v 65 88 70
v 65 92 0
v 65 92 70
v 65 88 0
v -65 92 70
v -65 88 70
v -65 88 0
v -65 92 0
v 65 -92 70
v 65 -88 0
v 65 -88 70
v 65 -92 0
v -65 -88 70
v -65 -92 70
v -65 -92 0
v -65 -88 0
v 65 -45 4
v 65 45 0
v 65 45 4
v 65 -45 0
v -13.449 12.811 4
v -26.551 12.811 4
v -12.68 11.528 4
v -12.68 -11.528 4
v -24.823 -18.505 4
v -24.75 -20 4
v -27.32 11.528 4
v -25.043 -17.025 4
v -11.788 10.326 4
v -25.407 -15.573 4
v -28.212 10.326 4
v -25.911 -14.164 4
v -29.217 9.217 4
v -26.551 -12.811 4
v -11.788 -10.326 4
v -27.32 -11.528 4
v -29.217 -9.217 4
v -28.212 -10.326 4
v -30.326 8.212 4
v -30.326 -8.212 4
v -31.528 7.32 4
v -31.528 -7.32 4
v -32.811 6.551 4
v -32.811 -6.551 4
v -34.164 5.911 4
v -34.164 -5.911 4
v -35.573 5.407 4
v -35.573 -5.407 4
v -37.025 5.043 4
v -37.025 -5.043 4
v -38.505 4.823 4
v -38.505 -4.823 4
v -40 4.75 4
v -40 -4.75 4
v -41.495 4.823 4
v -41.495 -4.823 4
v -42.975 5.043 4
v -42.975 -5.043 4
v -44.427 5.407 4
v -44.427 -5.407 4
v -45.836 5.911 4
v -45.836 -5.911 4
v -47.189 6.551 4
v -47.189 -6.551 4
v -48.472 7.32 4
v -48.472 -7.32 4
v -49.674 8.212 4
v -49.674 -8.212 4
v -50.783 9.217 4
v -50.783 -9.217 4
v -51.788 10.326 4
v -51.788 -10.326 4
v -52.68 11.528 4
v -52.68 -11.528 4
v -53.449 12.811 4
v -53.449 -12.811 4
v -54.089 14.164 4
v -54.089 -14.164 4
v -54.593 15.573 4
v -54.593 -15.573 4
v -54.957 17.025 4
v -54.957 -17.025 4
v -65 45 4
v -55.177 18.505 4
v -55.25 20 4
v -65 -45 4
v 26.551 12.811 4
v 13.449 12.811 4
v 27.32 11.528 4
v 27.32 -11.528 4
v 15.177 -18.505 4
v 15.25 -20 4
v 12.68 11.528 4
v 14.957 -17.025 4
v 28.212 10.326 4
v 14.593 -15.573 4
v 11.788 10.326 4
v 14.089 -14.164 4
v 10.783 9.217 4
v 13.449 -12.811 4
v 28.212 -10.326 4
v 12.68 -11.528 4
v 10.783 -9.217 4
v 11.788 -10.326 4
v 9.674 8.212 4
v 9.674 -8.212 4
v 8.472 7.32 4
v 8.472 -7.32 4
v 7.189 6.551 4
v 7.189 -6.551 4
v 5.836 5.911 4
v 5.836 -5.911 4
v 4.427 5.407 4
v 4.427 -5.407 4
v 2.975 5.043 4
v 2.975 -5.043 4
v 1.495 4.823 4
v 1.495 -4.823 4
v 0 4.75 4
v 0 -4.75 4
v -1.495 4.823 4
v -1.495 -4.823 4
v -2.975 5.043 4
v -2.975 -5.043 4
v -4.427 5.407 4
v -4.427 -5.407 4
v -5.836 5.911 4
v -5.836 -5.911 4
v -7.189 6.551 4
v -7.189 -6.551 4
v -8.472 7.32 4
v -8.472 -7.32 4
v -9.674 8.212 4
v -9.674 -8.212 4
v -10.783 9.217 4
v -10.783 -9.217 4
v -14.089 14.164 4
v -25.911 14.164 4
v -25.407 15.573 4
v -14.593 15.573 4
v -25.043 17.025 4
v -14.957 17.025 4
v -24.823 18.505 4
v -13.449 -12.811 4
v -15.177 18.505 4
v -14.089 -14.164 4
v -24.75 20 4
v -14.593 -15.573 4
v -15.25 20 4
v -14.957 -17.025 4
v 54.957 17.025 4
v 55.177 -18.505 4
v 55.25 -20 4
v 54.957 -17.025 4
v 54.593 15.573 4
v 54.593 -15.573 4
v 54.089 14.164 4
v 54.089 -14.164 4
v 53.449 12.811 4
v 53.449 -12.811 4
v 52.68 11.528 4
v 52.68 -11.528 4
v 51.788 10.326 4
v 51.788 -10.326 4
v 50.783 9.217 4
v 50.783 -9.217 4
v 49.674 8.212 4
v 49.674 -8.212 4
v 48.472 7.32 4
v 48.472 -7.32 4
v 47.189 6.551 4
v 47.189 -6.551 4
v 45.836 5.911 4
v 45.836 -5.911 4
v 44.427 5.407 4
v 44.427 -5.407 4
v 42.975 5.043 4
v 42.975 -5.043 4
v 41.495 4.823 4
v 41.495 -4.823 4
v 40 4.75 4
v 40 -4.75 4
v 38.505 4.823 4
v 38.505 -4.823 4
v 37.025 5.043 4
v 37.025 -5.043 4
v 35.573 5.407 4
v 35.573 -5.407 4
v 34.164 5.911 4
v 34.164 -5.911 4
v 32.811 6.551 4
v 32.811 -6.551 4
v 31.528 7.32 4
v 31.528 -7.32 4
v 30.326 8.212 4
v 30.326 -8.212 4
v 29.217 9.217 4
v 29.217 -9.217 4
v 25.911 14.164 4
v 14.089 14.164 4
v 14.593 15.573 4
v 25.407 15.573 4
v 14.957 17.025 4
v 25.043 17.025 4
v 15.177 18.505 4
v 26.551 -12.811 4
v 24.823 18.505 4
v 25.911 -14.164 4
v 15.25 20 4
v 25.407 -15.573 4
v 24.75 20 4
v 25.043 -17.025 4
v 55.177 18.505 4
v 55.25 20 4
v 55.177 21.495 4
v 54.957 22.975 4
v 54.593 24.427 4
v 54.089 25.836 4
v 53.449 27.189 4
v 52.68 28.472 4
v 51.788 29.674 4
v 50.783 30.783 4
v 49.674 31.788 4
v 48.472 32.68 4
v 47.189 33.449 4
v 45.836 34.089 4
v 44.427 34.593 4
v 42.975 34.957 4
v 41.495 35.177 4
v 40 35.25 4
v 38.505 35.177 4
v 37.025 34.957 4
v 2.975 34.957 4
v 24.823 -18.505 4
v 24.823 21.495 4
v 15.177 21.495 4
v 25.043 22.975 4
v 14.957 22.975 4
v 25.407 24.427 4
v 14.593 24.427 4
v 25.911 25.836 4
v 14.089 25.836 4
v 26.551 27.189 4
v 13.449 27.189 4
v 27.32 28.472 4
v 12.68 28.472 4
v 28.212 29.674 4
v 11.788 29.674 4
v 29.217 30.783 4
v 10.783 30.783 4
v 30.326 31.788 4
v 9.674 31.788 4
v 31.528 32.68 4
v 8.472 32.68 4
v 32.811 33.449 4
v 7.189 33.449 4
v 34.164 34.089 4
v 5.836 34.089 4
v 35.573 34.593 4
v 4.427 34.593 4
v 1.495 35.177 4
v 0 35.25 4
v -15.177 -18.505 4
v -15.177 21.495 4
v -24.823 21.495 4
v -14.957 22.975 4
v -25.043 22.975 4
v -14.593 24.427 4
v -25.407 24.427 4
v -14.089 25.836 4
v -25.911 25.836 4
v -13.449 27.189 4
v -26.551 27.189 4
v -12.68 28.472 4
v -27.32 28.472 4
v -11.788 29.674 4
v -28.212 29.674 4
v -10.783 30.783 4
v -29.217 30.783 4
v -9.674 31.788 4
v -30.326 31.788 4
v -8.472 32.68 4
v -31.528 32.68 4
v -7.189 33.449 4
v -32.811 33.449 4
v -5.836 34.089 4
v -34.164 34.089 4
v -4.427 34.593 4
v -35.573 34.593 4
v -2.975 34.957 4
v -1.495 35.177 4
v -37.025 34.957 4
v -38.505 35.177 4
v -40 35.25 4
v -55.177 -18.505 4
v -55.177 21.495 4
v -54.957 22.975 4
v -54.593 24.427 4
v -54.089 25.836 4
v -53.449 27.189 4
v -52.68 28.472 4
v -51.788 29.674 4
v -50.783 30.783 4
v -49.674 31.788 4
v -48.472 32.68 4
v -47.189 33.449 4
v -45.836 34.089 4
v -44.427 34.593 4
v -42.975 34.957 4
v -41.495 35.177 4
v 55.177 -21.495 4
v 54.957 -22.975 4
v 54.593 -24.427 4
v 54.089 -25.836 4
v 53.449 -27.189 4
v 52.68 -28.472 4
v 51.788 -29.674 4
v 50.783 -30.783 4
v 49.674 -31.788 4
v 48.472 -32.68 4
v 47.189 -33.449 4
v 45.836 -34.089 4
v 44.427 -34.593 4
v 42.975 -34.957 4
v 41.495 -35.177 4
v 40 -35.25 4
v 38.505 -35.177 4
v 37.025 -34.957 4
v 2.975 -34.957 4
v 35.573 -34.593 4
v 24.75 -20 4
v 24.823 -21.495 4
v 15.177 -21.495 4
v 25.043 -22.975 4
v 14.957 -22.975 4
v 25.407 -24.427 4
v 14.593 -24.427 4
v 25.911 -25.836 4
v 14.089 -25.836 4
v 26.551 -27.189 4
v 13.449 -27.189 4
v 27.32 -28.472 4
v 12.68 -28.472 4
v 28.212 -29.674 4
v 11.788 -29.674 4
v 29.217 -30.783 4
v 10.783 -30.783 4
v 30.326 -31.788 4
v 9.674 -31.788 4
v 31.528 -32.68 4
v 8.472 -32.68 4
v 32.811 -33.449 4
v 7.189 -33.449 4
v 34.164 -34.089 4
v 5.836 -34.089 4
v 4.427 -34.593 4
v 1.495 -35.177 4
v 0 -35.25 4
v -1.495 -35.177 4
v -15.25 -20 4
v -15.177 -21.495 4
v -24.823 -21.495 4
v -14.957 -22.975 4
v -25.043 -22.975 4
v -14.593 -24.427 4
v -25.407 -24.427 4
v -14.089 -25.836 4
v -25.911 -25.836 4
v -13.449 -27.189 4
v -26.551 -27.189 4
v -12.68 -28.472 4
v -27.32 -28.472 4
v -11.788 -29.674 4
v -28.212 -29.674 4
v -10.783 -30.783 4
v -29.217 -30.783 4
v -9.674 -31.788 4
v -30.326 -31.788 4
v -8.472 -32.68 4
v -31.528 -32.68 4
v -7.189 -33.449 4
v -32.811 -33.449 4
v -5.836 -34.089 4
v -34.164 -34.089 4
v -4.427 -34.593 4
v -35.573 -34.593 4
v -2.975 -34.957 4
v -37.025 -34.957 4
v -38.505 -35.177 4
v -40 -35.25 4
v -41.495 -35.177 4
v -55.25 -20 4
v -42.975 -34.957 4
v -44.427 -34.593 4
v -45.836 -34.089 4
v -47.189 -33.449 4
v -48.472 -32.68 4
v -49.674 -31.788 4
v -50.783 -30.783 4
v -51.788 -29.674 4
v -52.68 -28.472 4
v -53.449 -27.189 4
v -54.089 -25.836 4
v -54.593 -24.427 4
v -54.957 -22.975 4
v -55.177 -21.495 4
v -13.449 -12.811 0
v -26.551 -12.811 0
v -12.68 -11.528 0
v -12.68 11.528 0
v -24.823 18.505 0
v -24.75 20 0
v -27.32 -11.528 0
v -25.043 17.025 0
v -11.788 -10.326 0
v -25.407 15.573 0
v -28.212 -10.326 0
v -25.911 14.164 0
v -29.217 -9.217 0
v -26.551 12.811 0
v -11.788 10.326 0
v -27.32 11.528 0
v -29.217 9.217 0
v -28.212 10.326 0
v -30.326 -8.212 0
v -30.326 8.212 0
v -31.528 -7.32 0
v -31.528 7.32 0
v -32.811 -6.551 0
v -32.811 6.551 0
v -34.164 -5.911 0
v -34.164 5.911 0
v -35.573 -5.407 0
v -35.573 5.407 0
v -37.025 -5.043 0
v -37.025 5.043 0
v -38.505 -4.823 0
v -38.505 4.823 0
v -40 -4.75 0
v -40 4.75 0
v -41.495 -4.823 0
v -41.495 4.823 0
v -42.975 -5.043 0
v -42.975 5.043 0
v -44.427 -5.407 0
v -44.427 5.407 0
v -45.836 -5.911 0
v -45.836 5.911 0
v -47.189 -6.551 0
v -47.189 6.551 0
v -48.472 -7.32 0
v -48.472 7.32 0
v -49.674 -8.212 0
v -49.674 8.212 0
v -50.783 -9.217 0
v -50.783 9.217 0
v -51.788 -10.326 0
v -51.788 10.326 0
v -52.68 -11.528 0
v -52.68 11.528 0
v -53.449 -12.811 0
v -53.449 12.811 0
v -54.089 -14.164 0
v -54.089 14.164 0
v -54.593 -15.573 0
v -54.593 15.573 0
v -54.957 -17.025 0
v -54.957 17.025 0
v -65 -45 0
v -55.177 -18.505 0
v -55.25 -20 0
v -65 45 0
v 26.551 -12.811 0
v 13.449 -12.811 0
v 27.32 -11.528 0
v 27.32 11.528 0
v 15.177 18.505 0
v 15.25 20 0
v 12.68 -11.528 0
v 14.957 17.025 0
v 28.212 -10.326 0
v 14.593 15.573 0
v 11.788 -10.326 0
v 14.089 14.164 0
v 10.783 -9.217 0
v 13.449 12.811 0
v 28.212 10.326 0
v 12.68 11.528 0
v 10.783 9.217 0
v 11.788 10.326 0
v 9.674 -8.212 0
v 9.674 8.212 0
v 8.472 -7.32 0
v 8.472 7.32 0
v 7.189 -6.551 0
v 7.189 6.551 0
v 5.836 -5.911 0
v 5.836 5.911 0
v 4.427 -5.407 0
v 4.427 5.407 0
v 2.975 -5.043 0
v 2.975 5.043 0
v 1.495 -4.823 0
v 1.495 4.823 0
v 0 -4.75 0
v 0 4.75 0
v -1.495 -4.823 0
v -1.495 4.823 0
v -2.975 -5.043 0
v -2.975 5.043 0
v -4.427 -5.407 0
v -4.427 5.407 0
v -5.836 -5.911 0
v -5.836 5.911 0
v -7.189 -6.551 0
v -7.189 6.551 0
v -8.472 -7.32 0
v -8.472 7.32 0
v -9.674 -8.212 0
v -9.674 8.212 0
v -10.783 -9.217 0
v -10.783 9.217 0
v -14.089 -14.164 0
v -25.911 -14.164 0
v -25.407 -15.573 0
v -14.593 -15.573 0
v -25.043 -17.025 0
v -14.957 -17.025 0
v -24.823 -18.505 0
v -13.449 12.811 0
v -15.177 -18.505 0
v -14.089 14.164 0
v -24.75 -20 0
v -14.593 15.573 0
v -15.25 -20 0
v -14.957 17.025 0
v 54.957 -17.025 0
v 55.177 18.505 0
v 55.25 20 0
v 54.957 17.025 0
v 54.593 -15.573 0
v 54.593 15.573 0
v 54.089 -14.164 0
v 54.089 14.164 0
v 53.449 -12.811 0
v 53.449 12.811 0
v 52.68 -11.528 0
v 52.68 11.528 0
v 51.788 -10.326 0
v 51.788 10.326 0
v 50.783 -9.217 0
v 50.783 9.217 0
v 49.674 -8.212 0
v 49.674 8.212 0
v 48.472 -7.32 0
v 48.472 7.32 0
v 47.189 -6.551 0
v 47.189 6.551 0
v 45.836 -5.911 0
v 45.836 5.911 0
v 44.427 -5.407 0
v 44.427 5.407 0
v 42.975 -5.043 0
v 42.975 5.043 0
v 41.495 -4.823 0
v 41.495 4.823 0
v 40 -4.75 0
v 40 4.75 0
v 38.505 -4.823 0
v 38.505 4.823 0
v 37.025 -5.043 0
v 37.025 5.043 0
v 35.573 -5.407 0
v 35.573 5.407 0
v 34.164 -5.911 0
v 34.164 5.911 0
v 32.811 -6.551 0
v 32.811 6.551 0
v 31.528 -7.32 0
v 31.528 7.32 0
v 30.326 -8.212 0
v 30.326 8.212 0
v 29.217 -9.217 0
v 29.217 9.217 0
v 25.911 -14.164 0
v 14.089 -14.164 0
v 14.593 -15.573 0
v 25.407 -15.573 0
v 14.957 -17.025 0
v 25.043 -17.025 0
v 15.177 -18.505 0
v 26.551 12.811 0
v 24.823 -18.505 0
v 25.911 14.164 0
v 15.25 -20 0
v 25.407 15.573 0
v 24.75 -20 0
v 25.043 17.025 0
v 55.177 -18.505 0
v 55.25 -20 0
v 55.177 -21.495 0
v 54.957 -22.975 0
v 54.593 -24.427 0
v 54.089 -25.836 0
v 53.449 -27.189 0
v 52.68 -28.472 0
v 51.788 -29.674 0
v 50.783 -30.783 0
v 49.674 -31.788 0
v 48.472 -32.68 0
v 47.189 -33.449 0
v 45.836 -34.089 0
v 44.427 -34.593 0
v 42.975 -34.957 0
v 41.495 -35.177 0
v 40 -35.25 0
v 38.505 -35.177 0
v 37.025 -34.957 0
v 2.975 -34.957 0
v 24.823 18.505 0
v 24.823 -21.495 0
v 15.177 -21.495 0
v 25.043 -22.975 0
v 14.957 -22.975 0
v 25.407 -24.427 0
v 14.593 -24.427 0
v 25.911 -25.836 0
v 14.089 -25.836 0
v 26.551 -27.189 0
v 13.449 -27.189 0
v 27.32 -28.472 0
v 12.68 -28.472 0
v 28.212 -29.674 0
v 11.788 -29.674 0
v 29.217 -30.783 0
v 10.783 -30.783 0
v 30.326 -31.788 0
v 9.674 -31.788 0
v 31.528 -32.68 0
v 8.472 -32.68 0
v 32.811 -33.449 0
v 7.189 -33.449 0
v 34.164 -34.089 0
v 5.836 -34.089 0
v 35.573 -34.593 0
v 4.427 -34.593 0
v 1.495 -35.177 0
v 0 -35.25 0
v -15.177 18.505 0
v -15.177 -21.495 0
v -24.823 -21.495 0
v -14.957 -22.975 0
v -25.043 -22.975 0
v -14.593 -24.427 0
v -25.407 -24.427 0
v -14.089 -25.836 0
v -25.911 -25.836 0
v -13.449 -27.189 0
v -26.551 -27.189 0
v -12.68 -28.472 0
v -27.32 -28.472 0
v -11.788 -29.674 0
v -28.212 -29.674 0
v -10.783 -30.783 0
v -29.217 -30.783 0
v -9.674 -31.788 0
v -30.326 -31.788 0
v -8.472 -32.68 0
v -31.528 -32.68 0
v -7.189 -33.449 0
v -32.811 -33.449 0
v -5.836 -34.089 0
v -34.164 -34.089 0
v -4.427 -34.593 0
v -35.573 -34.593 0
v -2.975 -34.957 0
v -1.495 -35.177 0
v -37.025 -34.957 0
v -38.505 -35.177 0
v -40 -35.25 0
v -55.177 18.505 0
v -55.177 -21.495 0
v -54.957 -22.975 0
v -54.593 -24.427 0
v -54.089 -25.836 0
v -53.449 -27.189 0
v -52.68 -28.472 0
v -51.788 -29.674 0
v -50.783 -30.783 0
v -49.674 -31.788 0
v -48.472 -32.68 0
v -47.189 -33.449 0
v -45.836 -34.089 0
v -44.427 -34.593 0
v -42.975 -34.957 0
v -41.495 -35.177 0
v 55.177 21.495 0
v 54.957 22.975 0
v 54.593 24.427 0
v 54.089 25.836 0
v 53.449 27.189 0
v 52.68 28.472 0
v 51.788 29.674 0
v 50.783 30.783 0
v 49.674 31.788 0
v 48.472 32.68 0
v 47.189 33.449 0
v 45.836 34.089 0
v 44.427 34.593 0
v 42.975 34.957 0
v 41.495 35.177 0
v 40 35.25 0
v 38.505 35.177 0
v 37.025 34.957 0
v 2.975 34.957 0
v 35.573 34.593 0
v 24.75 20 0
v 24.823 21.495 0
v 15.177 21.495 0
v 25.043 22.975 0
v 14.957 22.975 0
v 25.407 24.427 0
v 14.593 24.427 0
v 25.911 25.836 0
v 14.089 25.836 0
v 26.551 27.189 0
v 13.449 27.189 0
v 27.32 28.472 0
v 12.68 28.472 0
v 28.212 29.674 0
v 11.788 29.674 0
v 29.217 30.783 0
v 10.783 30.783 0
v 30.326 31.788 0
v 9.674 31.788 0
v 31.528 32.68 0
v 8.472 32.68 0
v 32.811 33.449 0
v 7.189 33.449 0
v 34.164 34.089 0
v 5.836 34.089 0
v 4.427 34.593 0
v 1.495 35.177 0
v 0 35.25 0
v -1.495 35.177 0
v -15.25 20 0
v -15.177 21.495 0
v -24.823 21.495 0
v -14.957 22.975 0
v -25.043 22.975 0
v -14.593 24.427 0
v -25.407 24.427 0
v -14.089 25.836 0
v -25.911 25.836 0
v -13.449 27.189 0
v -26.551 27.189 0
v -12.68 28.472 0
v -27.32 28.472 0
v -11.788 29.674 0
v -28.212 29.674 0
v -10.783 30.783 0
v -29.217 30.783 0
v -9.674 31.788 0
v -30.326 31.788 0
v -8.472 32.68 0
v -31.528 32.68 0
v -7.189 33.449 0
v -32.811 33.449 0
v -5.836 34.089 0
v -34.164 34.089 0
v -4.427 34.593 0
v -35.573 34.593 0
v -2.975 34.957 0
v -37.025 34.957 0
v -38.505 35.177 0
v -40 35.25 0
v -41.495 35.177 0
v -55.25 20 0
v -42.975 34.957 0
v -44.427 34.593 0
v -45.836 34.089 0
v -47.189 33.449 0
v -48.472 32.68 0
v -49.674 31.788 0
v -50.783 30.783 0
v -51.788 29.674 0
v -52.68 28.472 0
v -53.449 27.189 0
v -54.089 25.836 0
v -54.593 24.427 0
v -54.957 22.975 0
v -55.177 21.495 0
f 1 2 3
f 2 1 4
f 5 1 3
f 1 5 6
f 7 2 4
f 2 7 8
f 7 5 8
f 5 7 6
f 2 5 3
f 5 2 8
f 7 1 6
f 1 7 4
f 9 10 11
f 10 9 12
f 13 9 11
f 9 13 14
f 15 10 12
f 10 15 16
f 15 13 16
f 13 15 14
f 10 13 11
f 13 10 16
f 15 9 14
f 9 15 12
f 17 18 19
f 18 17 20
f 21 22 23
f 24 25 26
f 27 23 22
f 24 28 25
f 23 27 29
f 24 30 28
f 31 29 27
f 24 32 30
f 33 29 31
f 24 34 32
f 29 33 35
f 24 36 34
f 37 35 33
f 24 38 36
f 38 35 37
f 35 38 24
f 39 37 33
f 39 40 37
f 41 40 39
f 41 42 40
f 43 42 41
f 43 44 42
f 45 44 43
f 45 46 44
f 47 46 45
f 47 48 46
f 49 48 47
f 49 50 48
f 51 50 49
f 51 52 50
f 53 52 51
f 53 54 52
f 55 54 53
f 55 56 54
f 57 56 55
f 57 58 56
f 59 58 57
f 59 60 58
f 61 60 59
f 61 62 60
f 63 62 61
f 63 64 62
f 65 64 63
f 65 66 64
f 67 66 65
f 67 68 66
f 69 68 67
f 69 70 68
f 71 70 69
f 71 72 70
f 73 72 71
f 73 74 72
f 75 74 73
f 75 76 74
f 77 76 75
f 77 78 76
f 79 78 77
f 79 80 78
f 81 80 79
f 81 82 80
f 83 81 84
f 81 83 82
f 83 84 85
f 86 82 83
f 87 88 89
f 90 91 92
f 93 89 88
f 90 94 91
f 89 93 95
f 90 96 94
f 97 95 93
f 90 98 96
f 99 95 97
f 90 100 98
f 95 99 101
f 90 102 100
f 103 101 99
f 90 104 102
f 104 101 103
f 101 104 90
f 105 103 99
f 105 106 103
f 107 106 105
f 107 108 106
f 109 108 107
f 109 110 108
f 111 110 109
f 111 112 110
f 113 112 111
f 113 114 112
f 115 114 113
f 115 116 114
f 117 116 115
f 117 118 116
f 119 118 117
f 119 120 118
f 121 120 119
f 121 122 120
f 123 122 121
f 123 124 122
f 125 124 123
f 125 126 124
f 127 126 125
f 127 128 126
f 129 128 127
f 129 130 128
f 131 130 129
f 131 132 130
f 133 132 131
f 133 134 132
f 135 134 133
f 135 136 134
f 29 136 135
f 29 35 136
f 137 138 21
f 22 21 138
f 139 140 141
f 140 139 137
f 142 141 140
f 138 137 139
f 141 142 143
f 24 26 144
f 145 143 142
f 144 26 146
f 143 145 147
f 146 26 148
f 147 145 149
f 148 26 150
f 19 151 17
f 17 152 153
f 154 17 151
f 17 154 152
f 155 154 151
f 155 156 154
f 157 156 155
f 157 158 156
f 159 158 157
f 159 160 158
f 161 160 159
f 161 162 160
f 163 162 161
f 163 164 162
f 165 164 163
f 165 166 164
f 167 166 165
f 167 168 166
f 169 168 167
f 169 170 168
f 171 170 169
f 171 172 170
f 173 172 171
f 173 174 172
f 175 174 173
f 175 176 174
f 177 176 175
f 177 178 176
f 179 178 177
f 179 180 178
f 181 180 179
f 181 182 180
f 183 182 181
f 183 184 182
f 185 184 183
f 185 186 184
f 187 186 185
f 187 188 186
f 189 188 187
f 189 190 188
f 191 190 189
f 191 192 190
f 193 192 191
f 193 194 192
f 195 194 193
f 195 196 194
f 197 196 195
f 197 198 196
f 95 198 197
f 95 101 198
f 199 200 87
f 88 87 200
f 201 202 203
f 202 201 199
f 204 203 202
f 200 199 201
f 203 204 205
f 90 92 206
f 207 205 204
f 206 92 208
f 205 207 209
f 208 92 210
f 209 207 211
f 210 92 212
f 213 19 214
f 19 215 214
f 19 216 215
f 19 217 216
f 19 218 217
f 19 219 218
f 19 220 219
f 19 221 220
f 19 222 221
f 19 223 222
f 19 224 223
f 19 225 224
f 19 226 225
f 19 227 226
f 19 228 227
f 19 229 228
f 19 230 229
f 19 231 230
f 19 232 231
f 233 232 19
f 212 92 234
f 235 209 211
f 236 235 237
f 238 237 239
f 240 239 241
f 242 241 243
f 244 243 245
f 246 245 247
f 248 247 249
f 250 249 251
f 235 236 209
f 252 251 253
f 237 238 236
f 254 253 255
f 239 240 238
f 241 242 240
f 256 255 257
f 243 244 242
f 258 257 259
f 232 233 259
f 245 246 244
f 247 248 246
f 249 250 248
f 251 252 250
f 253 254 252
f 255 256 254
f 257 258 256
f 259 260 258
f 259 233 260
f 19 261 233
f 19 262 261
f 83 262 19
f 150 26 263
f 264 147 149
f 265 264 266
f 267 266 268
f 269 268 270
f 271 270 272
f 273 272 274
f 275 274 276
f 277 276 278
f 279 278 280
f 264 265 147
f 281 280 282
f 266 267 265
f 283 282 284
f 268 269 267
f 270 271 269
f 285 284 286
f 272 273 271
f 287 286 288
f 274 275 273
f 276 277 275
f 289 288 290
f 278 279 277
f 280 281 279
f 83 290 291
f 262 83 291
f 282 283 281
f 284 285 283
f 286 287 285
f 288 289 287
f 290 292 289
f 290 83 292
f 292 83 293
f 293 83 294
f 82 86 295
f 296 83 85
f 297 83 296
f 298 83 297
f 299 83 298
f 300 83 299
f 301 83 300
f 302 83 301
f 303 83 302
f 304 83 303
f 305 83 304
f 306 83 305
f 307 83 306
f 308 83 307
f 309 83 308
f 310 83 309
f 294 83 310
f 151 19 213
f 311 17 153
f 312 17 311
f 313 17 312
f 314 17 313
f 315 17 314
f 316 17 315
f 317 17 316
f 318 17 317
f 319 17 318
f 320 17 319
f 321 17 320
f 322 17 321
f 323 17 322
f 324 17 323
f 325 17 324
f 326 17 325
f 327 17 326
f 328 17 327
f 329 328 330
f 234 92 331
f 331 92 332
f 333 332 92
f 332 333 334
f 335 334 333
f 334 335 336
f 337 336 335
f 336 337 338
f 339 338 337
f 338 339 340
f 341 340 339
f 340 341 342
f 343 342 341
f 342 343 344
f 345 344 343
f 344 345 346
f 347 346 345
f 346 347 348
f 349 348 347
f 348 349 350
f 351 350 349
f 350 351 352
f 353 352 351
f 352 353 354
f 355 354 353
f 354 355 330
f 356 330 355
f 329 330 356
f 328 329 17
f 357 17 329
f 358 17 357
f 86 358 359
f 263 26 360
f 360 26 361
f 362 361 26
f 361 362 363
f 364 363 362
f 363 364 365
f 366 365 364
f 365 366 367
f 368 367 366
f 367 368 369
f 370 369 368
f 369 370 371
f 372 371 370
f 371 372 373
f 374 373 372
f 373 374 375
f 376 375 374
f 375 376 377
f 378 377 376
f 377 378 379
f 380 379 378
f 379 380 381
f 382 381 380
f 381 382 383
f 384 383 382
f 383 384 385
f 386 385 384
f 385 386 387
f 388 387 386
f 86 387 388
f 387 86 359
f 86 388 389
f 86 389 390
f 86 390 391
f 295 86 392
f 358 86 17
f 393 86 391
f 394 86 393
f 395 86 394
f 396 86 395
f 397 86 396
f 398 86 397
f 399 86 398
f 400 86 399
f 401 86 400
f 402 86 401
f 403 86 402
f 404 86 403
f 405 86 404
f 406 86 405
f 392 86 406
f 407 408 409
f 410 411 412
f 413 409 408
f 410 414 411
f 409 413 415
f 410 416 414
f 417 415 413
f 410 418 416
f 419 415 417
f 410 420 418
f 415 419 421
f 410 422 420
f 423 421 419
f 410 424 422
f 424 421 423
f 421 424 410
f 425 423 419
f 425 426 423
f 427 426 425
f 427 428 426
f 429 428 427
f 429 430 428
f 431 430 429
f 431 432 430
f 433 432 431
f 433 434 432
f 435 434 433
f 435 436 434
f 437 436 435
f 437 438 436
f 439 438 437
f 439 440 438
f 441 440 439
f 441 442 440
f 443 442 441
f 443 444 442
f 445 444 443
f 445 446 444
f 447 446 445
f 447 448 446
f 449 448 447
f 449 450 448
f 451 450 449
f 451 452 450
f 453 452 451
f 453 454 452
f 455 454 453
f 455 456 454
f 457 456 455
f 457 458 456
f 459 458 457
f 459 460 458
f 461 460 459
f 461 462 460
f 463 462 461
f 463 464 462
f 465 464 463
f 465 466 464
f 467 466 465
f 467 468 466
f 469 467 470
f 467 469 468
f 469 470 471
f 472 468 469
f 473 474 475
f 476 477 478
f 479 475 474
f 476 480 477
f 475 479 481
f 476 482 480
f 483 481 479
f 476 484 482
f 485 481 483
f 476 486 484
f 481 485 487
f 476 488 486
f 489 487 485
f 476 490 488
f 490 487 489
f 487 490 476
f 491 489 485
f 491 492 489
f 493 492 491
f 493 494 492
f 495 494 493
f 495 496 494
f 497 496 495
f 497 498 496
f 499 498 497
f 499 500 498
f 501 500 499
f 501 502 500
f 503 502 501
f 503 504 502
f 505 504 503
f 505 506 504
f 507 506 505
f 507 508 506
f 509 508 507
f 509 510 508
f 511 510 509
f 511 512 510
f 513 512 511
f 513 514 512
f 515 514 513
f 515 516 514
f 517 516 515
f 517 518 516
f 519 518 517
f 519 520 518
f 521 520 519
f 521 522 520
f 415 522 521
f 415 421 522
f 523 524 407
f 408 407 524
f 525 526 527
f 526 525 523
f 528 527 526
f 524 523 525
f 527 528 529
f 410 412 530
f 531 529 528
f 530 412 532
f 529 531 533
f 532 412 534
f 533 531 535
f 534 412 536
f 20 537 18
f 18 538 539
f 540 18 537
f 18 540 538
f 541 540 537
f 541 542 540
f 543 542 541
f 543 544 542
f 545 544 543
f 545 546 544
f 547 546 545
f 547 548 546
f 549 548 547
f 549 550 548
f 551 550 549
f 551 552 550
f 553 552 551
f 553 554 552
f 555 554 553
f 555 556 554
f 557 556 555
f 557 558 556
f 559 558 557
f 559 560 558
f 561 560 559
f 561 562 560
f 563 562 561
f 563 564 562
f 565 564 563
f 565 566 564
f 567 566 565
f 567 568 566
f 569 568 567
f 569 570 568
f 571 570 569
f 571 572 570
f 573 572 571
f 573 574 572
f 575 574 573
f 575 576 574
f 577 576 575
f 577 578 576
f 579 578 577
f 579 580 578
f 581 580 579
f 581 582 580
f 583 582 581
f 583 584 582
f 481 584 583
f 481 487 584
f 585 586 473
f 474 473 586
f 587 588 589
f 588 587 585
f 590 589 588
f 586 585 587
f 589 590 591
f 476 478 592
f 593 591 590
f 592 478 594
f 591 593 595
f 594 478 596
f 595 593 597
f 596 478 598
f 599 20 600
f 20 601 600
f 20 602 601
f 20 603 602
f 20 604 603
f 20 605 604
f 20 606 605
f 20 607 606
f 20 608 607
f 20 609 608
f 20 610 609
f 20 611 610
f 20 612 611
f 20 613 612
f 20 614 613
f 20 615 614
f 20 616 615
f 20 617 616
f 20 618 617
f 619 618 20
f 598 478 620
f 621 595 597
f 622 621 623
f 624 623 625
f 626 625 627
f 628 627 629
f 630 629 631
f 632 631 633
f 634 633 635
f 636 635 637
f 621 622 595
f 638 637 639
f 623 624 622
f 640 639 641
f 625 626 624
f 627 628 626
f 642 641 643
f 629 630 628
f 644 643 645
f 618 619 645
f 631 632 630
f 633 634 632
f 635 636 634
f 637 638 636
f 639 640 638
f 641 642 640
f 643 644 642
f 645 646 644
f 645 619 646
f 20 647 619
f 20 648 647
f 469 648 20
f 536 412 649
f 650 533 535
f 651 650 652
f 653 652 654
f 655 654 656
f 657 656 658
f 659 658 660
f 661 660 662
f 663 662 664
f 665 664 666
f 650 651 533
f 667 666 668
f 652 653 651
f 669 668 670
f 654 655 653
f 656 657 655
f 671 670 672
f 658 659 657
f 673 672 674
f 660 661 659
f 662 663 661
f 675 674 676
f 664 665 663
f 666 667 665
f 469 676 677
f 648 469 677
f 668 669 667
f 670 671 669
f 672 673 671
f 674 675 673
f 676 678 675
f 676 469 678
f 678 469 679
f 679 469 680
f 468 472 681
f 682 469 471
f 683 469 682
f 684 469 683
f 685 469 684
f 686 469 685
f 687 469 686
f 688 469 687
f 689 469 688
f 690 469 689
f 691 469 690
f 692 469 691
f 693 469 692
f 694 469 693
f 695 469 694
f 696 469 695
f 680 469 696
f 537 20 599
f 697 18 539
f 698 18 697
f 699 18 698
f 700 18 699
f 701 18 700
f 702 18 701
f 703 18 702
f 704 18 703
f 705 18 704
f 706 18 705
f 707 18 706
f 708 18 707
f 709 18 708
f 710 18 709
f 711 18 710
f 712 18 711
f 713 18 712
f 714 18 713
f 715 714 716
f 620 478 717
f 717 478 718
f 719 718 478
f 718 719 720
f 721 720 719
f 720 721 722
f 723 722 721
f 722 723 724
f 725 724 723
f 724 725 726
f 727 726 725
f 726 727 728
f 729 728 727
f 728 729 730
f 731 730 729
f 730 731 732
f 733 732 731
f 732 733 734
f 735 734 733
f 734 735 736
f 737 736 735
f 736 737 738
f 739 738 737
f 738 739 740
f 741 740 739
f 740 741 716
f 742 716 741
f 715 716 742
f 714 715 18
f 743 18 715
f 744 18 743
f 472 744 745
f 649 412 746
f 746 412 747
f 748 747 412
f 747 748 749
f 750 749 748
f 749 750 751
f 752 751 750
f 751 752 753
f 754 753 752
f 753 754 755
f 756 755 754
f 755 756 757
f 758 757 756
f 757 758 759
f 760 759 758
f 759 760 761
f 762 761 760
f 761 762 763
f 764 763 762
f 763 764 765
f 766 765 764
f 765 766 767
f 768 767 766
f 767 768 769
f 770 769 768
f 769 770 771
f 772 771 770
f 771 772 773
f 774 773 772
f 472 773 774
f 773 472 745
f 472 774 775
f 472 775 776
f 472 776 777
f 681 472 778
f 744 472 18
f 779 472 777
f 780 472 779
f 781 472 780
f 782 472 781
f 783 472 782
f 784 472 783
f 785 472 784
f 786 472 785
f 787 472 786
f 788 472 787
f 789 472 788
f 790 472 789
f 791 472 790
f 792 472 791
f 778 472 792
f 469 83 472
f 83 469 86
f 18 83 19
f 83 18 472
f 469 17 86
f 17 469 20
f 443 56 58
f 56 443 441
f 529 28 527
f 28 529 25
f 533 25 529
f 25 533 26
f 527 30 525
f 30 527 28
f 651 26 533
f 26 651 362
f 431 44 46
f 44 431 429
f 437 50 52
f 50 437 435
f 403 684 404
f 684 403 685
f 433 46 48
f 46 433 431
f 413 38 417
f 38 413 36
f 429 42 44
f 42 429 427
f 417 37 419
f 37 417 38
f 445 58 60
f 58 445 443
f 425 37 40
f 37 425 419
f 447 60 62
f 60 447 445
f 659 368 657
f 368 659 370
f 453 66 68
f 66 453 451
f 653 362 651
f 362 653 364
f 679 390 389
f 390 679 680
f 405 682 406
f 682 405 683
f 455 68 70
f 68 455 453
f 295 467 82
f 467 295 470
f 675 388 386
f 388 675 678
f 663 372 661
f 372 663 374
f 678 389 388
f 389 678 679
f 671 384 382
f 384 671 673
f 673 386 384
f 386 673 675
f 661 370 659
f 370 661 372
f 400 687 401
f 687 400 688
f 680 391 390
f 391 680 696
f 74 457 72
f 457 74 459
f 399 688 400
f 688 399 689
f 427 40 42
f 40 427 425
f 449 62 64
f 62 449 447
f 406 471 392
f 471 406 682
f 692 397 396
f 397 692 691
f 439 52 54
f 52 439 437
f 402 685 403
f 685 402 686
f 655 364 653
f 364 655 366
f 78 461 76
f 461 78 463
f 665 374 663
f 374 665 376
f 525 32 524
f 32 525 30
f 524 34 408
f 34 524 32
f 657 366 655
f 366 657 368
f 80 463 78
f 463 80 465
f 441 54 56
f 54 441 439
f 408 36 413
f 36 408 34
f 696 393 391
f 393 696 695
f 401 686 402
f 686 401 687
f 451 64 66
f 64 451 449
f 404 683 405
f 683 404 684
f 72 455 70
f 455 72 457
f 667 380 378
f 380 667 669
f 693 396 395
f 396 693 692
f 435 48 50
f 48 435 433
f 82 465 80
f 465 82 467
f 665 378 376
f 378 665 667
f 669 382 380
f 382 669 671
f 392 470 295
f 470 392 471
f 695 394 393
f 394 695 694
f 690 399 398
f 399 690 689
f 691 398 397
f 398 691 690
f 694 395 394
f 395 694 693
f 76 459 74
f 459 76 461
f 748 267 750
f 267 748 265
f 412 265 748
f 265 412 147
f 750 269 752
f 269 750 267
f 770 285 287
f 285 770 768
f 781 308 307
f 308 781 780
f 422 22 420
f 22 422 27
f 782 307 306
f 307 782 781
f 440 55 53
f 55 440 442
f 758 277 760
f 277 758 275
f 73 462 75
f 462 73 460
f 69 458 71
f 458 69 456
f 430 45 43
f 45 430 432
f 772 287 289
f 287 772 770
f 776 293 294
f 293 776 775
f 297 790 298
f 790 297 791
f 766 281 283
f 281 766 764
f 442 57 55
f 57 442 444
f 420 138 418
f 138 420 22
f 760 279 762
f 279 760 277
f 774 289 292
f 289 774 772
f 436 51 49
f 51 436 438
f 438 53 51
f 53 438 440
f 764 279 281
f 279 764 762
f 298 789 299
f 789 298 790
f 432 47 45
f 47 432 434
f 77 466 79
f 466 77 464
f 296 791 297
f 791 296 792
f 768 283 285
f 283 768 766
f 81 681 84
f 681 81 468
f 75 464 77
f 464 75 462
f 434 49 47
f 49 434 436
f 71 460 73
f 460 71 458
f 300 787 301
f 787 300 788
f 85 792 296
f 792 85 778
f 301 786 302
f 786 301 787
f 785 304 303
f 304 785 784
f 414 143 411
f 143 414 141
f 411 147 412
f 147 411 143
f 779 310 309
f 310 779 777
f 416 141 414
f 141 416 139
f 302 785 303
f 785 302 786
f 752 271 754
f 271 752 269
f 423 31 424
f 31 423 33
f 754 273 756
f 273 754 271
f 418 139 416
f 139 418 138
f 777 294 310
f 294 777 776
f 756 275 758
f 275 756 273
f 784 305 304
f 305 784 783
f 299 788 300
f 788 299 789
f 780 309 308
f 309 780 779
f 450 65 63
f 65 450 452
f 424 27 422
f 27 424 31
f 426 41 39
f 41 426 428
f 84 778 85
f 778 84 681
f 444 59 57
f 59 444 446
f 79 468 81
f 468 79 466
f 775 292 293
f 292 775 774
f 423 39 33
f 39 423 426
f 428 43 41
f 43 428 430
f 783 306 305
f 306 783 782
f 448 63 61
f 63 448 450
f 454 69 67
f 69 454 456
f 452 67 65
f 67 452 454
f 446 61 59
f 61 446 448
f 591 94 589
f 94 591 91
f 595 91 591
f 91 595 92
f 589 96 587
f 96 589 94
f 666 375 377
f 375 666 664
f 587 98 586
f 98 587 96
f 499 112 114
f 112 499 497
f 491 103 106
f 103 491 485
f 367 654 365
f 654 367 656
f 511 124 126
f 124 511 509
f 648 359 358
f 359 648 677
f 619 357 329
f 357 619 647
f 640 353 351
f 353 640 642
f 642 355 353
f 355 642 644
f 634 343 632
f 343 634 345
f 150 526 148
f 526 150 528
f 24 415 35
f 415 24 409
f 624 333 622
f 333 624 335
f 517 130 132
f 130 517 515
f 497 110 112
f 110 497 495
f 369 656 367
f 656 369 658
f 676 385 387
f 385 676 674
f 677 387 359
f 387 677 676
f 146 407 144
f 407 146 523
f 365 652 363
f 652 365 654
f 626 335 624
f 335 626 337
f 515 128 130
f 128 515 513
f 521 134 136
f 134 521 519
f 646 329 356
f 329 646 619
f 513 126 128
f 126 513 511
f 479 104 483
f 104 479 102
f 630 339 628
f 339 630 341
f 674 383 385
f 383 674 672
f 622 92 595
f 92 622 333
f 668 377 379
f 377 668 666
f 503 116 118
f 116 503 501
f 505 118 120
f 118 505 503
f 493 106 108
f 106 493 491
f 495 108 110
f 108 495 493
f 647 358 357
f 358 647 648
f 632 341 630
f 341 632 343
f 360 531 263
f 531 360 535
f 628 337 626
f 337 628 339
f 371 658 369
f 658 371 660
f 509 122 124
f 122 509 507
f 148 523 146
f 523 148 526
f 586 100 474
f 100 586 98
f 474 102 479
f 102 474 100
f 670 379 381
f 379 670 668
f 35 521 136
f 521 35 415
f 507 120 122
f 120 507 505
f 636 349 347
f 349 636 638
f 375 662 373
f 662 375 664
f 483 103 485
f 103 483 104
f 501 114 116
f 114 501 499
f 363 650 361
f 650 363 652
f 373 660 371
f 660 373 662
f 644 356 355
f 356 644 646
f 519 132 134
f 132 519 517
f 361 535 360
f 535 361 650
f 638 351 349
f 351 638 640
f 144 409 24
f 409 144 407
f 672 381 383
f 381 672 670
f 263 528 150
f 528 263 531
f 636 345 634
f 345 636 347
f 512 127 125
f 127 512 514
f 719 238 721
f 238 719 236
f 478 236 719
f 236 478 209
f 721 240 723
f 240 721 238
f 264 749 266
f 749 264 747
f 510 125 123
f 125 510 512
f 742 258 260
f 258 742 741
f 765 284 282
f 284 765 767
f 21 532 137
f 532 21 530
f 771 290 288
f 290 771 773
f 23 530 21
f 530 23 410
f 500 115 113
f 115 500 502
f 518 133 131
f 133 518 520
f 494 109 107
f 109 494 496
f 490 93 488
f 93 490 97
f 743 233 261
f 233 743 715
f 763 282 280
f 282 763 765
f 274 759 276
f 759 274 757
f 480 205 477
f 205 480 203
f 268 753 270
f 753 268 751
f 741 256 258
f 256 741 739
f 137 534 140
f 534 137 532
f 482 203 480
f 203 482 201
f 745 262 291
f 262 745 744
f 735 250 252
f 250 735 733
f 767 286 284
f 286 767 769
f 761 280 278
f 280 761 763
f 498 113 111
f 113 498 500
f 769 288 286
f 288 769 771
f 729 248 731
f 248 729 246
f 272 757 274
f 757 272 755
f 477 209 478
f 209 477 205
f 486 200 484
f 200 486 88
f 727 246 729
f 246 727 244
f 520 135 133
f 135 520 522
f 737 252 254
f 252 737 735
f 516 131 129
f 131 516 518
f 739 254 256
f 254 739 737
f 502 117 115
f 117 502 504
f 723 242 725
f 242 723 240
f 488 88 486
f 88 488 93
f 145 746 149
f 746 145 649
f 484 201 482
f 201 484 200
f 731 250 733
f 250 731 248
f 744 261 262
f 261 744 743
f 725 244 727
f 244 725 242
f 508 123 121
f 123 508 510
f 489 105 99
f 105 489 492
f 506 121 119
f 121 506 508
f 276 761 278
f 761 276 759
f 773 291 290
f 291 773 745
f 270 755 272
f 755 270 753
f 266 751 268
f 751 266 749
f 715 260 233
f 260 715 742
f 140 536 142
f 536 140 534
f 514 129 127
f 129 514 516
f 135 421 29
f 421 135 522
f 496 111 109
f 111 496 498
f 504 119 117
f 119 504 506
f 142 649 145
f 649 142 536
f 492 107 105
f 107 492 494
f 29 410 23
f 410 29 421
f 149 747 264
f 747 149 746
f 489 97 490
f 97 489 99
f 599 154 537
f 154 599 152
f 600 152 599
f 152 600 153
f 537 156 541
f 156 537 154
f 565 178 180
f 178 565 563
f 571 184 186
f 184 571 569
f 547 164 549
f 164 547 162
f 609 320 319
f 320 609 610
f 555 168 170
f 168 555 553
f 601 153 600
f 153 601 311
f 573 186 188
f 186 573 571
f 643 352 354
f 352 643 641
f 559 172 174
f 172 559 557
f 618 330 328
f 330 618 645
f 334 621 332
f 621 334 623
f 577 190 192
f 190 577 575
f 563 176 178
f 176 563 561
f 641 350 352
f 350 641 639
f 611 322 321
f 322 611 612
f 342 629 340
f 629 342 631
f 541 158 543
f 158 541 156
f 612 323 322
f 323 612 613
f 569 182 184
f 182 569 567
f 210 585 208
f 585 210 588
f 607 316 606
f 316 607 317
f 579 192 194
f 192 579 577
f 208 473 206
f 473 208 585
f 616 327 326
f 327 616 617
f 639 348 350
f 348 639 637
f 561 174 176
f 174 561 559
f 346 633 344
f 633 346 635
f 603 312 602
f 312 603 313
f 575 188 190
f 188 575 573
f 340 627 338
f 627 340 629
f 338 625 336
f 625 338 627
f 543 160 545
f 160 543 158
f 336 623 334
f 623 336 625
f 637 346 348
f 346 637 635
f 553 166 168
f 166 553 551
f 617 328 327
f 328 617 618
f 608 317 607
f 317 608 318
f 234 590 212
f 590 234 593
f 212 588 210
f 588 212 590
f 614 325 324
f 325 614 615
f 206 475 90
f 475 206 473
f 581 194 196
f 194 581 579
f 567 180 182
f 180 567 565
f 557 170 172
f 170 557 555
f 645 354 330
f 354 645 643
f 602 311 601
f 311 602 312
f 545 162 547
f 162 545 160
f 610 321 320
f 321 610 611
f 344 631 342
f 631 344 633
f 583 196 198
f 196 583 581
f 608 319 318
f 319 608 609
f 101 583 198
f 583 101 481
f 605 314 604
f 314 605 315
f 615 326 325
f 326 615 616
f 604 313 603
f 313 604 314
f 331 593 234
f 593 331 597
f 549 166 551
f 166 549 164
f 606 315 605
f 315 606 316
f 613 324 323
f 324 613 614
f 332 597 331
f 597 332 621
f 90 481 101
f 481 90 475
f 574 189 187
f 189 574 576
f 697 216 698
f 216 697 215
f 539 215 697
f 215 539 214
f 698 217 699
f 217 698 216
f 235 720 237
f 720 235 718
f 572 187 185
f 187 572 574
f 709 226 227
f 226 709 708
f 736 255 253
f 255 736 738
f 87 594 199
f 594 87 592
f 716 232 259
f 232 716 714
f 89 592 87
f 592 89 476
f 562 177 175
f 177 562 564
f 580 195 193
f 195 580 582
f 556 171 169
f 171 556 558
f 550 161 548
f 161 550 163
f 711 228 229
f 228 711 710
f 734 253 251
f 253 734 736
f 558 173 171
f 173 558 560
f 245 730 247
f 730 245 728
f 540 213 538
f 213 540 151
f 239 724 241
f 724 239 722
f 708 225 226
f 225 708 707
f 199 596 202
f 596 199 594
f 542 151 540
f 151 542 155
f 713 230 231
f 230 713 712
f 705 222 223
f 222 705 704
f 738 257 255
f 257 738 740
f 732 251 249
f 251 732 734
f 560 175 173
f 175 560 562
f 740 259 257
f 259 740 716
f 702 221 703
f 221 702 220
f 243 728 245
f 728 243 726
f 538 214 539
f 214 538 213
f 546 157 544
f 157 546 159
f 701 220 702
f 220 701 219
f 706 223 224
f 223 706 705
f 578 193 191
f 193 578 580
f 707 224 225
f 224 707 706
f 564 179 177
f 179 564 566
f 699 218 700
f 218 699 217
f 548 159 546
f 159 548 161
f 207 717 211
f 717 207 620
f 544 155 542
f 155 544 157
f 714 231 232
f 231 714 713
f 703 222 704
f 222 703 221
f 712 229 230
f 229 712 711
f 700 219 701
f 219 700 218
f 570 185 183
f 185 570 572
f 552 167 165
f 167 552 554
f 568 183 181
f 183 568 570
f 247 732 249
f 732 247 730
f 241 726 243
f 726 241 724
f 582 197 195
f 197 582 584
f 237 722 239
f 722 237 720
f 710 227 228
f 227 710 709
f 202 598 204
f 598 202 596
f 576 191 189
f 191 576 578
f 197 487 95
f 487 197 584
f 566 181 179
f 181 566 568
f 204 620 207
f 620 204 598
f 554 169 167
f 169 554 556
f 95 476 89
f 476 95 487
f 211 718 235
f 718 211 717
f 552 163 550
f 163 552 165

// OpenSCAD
// Rack for six 50 mL conical (Falcon-type) tubes
// Printed upside down and flipped over after printing

$fn = 64;

// Plate dimensions
plate_x = 130; // mm, X direction
plate_y = 90;  // mm, Y direction
plate_z = 4;   // mm, thickness

// Hole pattern
hole_diameter = 30.5; // mm
hole_spacing_x = 40;  // mm, centre-to-centre in X
hole_spacing_y = 40;  // mm, centre-to-centre in Y
hole_rows = 2;        // number of rows (along Y)
hole_cols = 3;        // number of columns (along X)

// Wall dimensions
wall_thickness = 4;   // mm
wall_height = 70;     // mm

// Compute hole positions (centred on plate)
hole_x_offset = (plate_x - (hole_cols - 1) * hole_spacing_x) / 2;
hole_y_offset = (plate_y - (hole_rows - 1) * hole_spacing_y) / 2;

// Compute wall positions (flush with plate's long edges)
// Long edges are along X (130 mm), so walls run along X at Y edges
wall_y_pos_front = plate_y / 2;   // front wall (positive Y side)
wall_y_pos_back  = -plate_y / 2;  // back wall (negative Y side)

// Plate base
module plate_base() {
    translate([0, 0, plate_z/2]) {
        cube([plate_x, plate_y, plate_z], center=true);
    }
}

// Holes for tubes
module hole_grid() {
    for (i = [0 : hole_cols - 1]) {
        for (j = [0 : hole_rows - 1]) {
            x = -plate_x/2 + hole_x_offset + i * hole_spacing_x;
            y = -plate_y/2 + hole_y_offset + j * hole_spacing_y;
            translate([x, y, -1]) {
                cylinder(h = plate_z + 2, r = hole_diameter/2, center=false);
            }
        }
    }
}

// Walls along long edges (X direction)
module walls() {
    // Front wall (positive Y edge)
    translate([0, wall_y_pos_front + plate_y/2, wall_height/2]) {
        cube([plate_x, wall_thickness, wall_height], center=true);
    }
    
    // Back wall (negative Y edge)
    translate([0, wall_y_pos_back - plate_y/2, wall_height/2]) {
        cube([plate_x, wall_thickness, wall_height], center=true);
    }
}

// Combine all parts
module rack() {
    difference() {
        union() {
            plate_base();
            walls();
        }
        hole_grid();
    }
}

rack();
